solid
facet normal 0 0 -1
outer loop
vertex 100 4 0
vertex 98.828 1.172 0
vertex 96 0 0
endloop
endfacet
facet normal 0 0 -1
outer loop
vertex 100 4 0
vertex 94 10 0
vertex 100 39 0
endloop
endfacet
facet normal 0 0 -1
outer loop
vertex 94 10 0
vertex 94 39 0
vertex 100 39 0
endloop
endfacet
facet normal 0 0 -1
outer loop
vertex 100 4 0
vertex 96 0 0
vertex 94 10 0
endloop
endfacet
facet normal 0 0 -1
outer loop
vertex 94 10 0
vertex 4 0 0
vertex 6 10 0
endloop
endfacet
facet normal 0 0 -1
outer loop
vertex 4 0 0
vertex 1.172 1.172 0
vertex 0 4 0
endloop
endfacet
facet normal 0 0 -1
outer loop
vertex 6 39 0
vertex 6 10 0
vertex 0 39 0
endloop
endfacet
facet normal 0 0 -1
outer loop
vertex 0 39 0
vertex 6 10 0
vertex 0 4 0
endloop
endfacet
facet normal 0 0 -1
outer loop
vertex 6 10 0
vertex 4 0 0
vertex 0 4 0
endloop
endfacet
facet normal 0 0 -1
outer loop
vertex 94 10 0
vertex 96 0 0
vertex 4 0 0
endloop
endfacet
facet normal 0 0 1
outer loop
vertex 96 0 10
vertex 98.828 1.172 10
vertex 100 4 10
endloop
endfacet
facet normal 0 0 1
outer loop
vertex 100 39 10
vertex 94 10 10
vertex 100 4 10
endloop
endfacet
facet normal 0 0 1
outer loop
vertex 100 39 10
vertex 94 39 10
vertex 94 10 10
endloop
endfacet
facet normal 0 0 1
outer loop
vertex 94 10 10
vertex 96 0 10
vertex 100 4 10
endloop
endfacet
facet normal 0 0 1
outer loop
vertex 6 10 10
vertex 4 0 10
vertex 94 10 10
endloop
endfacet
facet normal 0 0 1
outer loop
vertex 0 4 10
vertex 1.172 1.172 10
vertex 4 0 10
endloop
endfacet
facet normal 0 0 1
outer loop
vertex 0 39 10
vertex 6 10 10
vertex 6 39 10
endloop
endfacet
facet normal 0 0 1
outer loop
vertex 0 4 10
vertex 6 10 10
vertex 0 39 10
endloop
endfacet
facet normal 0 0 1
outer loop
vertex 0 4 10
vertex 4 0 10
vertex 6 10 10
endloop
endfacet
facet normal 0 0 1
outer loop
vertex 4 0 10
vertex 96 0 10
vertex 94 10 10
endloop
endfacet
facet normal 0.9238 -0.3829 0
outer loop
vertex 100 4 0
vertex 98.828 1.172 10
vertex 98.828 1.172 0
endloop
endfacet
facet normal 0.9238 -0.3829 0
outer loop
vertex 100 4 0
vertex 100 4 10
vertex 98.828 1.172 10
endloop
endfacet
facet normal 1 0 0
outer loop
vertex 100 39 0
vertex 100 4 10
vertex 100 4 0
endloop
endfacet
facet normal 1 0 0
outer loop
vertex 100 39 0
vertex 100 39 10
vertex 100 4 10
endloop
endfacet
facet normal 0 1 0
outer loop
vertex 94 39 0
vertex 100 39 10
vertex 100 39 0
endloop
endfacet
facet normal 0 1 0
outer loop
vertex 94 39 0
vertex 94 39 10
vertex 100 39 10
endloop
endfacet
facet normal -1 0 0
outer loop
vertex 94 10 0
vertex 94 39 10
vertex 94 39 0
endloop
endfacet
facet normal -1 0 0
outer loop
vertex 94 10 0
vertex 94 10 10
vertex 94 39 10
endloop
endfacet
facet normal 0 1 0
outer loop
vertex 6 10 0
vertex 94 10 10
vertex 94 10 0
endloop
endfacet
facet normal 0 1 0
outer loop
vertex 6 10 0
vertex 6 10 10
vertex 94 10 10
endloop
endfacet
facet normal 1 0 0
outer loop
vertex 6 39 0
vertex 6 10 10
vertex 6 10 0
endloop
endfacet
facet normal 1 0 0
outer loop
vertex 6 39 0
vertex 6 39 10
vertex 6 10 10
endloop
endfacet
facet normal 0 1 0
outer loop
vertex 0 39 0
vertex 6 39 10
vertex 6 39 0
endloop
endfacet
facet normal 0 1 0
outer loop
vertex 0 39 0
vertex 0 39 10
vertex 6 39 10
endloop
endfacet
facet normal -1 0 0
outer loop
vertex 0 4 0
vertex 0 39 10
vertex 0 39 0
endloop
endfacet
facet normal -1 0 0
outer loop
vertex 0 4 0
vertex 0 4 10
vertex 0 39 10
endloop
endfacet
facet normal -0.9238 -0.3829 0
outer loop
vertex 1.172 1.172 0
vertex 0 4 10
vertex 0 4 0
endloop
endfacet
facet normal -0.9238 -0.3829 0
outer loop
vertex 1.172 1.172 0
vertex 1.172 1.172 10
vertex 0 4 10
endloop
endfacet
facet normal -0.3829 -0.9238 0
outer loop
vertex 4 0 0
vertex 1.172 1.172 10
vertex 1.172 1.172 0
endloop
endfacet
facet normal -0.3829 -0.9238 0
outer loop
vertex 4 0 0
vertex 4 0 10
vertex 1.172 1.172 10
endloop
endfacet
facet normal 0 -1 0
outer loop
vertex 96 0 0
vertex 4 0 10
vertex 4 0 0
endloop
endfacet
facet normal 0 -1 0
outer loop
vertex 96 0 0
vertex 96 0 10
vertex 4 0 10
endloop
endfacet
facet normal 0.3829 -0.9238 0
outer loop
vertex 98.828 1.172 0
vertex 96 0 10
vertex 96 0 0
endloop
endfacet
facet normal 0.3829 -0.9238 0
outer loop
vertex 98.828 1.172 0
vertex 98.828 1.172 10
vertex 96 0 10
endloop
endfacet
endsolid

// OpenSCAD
$fn = 32;

// ----------------------------------------------------------------------
// Heat sink frame: 100 x 39 mm frame, 6 mm walls
// ----------------------------------------------------------------------

// --- parameters (mm) ---
profile_height = 10;      // extrusion height
profile_points = 12;      // points of the closed outline

profile = [[0, 4], [1.172, 1.172], [4, 0], [96, 0], [98.828, 1.172], [100, 4], [100, 39], [94, 39], [94, 10], [6, 10], [6, 39], [0, 39]];  // single closed polygon, 12 points, counter clockwise

// --- the one profile operation ---
linear_extrude(height = profile_height) polygon(points = profile);
